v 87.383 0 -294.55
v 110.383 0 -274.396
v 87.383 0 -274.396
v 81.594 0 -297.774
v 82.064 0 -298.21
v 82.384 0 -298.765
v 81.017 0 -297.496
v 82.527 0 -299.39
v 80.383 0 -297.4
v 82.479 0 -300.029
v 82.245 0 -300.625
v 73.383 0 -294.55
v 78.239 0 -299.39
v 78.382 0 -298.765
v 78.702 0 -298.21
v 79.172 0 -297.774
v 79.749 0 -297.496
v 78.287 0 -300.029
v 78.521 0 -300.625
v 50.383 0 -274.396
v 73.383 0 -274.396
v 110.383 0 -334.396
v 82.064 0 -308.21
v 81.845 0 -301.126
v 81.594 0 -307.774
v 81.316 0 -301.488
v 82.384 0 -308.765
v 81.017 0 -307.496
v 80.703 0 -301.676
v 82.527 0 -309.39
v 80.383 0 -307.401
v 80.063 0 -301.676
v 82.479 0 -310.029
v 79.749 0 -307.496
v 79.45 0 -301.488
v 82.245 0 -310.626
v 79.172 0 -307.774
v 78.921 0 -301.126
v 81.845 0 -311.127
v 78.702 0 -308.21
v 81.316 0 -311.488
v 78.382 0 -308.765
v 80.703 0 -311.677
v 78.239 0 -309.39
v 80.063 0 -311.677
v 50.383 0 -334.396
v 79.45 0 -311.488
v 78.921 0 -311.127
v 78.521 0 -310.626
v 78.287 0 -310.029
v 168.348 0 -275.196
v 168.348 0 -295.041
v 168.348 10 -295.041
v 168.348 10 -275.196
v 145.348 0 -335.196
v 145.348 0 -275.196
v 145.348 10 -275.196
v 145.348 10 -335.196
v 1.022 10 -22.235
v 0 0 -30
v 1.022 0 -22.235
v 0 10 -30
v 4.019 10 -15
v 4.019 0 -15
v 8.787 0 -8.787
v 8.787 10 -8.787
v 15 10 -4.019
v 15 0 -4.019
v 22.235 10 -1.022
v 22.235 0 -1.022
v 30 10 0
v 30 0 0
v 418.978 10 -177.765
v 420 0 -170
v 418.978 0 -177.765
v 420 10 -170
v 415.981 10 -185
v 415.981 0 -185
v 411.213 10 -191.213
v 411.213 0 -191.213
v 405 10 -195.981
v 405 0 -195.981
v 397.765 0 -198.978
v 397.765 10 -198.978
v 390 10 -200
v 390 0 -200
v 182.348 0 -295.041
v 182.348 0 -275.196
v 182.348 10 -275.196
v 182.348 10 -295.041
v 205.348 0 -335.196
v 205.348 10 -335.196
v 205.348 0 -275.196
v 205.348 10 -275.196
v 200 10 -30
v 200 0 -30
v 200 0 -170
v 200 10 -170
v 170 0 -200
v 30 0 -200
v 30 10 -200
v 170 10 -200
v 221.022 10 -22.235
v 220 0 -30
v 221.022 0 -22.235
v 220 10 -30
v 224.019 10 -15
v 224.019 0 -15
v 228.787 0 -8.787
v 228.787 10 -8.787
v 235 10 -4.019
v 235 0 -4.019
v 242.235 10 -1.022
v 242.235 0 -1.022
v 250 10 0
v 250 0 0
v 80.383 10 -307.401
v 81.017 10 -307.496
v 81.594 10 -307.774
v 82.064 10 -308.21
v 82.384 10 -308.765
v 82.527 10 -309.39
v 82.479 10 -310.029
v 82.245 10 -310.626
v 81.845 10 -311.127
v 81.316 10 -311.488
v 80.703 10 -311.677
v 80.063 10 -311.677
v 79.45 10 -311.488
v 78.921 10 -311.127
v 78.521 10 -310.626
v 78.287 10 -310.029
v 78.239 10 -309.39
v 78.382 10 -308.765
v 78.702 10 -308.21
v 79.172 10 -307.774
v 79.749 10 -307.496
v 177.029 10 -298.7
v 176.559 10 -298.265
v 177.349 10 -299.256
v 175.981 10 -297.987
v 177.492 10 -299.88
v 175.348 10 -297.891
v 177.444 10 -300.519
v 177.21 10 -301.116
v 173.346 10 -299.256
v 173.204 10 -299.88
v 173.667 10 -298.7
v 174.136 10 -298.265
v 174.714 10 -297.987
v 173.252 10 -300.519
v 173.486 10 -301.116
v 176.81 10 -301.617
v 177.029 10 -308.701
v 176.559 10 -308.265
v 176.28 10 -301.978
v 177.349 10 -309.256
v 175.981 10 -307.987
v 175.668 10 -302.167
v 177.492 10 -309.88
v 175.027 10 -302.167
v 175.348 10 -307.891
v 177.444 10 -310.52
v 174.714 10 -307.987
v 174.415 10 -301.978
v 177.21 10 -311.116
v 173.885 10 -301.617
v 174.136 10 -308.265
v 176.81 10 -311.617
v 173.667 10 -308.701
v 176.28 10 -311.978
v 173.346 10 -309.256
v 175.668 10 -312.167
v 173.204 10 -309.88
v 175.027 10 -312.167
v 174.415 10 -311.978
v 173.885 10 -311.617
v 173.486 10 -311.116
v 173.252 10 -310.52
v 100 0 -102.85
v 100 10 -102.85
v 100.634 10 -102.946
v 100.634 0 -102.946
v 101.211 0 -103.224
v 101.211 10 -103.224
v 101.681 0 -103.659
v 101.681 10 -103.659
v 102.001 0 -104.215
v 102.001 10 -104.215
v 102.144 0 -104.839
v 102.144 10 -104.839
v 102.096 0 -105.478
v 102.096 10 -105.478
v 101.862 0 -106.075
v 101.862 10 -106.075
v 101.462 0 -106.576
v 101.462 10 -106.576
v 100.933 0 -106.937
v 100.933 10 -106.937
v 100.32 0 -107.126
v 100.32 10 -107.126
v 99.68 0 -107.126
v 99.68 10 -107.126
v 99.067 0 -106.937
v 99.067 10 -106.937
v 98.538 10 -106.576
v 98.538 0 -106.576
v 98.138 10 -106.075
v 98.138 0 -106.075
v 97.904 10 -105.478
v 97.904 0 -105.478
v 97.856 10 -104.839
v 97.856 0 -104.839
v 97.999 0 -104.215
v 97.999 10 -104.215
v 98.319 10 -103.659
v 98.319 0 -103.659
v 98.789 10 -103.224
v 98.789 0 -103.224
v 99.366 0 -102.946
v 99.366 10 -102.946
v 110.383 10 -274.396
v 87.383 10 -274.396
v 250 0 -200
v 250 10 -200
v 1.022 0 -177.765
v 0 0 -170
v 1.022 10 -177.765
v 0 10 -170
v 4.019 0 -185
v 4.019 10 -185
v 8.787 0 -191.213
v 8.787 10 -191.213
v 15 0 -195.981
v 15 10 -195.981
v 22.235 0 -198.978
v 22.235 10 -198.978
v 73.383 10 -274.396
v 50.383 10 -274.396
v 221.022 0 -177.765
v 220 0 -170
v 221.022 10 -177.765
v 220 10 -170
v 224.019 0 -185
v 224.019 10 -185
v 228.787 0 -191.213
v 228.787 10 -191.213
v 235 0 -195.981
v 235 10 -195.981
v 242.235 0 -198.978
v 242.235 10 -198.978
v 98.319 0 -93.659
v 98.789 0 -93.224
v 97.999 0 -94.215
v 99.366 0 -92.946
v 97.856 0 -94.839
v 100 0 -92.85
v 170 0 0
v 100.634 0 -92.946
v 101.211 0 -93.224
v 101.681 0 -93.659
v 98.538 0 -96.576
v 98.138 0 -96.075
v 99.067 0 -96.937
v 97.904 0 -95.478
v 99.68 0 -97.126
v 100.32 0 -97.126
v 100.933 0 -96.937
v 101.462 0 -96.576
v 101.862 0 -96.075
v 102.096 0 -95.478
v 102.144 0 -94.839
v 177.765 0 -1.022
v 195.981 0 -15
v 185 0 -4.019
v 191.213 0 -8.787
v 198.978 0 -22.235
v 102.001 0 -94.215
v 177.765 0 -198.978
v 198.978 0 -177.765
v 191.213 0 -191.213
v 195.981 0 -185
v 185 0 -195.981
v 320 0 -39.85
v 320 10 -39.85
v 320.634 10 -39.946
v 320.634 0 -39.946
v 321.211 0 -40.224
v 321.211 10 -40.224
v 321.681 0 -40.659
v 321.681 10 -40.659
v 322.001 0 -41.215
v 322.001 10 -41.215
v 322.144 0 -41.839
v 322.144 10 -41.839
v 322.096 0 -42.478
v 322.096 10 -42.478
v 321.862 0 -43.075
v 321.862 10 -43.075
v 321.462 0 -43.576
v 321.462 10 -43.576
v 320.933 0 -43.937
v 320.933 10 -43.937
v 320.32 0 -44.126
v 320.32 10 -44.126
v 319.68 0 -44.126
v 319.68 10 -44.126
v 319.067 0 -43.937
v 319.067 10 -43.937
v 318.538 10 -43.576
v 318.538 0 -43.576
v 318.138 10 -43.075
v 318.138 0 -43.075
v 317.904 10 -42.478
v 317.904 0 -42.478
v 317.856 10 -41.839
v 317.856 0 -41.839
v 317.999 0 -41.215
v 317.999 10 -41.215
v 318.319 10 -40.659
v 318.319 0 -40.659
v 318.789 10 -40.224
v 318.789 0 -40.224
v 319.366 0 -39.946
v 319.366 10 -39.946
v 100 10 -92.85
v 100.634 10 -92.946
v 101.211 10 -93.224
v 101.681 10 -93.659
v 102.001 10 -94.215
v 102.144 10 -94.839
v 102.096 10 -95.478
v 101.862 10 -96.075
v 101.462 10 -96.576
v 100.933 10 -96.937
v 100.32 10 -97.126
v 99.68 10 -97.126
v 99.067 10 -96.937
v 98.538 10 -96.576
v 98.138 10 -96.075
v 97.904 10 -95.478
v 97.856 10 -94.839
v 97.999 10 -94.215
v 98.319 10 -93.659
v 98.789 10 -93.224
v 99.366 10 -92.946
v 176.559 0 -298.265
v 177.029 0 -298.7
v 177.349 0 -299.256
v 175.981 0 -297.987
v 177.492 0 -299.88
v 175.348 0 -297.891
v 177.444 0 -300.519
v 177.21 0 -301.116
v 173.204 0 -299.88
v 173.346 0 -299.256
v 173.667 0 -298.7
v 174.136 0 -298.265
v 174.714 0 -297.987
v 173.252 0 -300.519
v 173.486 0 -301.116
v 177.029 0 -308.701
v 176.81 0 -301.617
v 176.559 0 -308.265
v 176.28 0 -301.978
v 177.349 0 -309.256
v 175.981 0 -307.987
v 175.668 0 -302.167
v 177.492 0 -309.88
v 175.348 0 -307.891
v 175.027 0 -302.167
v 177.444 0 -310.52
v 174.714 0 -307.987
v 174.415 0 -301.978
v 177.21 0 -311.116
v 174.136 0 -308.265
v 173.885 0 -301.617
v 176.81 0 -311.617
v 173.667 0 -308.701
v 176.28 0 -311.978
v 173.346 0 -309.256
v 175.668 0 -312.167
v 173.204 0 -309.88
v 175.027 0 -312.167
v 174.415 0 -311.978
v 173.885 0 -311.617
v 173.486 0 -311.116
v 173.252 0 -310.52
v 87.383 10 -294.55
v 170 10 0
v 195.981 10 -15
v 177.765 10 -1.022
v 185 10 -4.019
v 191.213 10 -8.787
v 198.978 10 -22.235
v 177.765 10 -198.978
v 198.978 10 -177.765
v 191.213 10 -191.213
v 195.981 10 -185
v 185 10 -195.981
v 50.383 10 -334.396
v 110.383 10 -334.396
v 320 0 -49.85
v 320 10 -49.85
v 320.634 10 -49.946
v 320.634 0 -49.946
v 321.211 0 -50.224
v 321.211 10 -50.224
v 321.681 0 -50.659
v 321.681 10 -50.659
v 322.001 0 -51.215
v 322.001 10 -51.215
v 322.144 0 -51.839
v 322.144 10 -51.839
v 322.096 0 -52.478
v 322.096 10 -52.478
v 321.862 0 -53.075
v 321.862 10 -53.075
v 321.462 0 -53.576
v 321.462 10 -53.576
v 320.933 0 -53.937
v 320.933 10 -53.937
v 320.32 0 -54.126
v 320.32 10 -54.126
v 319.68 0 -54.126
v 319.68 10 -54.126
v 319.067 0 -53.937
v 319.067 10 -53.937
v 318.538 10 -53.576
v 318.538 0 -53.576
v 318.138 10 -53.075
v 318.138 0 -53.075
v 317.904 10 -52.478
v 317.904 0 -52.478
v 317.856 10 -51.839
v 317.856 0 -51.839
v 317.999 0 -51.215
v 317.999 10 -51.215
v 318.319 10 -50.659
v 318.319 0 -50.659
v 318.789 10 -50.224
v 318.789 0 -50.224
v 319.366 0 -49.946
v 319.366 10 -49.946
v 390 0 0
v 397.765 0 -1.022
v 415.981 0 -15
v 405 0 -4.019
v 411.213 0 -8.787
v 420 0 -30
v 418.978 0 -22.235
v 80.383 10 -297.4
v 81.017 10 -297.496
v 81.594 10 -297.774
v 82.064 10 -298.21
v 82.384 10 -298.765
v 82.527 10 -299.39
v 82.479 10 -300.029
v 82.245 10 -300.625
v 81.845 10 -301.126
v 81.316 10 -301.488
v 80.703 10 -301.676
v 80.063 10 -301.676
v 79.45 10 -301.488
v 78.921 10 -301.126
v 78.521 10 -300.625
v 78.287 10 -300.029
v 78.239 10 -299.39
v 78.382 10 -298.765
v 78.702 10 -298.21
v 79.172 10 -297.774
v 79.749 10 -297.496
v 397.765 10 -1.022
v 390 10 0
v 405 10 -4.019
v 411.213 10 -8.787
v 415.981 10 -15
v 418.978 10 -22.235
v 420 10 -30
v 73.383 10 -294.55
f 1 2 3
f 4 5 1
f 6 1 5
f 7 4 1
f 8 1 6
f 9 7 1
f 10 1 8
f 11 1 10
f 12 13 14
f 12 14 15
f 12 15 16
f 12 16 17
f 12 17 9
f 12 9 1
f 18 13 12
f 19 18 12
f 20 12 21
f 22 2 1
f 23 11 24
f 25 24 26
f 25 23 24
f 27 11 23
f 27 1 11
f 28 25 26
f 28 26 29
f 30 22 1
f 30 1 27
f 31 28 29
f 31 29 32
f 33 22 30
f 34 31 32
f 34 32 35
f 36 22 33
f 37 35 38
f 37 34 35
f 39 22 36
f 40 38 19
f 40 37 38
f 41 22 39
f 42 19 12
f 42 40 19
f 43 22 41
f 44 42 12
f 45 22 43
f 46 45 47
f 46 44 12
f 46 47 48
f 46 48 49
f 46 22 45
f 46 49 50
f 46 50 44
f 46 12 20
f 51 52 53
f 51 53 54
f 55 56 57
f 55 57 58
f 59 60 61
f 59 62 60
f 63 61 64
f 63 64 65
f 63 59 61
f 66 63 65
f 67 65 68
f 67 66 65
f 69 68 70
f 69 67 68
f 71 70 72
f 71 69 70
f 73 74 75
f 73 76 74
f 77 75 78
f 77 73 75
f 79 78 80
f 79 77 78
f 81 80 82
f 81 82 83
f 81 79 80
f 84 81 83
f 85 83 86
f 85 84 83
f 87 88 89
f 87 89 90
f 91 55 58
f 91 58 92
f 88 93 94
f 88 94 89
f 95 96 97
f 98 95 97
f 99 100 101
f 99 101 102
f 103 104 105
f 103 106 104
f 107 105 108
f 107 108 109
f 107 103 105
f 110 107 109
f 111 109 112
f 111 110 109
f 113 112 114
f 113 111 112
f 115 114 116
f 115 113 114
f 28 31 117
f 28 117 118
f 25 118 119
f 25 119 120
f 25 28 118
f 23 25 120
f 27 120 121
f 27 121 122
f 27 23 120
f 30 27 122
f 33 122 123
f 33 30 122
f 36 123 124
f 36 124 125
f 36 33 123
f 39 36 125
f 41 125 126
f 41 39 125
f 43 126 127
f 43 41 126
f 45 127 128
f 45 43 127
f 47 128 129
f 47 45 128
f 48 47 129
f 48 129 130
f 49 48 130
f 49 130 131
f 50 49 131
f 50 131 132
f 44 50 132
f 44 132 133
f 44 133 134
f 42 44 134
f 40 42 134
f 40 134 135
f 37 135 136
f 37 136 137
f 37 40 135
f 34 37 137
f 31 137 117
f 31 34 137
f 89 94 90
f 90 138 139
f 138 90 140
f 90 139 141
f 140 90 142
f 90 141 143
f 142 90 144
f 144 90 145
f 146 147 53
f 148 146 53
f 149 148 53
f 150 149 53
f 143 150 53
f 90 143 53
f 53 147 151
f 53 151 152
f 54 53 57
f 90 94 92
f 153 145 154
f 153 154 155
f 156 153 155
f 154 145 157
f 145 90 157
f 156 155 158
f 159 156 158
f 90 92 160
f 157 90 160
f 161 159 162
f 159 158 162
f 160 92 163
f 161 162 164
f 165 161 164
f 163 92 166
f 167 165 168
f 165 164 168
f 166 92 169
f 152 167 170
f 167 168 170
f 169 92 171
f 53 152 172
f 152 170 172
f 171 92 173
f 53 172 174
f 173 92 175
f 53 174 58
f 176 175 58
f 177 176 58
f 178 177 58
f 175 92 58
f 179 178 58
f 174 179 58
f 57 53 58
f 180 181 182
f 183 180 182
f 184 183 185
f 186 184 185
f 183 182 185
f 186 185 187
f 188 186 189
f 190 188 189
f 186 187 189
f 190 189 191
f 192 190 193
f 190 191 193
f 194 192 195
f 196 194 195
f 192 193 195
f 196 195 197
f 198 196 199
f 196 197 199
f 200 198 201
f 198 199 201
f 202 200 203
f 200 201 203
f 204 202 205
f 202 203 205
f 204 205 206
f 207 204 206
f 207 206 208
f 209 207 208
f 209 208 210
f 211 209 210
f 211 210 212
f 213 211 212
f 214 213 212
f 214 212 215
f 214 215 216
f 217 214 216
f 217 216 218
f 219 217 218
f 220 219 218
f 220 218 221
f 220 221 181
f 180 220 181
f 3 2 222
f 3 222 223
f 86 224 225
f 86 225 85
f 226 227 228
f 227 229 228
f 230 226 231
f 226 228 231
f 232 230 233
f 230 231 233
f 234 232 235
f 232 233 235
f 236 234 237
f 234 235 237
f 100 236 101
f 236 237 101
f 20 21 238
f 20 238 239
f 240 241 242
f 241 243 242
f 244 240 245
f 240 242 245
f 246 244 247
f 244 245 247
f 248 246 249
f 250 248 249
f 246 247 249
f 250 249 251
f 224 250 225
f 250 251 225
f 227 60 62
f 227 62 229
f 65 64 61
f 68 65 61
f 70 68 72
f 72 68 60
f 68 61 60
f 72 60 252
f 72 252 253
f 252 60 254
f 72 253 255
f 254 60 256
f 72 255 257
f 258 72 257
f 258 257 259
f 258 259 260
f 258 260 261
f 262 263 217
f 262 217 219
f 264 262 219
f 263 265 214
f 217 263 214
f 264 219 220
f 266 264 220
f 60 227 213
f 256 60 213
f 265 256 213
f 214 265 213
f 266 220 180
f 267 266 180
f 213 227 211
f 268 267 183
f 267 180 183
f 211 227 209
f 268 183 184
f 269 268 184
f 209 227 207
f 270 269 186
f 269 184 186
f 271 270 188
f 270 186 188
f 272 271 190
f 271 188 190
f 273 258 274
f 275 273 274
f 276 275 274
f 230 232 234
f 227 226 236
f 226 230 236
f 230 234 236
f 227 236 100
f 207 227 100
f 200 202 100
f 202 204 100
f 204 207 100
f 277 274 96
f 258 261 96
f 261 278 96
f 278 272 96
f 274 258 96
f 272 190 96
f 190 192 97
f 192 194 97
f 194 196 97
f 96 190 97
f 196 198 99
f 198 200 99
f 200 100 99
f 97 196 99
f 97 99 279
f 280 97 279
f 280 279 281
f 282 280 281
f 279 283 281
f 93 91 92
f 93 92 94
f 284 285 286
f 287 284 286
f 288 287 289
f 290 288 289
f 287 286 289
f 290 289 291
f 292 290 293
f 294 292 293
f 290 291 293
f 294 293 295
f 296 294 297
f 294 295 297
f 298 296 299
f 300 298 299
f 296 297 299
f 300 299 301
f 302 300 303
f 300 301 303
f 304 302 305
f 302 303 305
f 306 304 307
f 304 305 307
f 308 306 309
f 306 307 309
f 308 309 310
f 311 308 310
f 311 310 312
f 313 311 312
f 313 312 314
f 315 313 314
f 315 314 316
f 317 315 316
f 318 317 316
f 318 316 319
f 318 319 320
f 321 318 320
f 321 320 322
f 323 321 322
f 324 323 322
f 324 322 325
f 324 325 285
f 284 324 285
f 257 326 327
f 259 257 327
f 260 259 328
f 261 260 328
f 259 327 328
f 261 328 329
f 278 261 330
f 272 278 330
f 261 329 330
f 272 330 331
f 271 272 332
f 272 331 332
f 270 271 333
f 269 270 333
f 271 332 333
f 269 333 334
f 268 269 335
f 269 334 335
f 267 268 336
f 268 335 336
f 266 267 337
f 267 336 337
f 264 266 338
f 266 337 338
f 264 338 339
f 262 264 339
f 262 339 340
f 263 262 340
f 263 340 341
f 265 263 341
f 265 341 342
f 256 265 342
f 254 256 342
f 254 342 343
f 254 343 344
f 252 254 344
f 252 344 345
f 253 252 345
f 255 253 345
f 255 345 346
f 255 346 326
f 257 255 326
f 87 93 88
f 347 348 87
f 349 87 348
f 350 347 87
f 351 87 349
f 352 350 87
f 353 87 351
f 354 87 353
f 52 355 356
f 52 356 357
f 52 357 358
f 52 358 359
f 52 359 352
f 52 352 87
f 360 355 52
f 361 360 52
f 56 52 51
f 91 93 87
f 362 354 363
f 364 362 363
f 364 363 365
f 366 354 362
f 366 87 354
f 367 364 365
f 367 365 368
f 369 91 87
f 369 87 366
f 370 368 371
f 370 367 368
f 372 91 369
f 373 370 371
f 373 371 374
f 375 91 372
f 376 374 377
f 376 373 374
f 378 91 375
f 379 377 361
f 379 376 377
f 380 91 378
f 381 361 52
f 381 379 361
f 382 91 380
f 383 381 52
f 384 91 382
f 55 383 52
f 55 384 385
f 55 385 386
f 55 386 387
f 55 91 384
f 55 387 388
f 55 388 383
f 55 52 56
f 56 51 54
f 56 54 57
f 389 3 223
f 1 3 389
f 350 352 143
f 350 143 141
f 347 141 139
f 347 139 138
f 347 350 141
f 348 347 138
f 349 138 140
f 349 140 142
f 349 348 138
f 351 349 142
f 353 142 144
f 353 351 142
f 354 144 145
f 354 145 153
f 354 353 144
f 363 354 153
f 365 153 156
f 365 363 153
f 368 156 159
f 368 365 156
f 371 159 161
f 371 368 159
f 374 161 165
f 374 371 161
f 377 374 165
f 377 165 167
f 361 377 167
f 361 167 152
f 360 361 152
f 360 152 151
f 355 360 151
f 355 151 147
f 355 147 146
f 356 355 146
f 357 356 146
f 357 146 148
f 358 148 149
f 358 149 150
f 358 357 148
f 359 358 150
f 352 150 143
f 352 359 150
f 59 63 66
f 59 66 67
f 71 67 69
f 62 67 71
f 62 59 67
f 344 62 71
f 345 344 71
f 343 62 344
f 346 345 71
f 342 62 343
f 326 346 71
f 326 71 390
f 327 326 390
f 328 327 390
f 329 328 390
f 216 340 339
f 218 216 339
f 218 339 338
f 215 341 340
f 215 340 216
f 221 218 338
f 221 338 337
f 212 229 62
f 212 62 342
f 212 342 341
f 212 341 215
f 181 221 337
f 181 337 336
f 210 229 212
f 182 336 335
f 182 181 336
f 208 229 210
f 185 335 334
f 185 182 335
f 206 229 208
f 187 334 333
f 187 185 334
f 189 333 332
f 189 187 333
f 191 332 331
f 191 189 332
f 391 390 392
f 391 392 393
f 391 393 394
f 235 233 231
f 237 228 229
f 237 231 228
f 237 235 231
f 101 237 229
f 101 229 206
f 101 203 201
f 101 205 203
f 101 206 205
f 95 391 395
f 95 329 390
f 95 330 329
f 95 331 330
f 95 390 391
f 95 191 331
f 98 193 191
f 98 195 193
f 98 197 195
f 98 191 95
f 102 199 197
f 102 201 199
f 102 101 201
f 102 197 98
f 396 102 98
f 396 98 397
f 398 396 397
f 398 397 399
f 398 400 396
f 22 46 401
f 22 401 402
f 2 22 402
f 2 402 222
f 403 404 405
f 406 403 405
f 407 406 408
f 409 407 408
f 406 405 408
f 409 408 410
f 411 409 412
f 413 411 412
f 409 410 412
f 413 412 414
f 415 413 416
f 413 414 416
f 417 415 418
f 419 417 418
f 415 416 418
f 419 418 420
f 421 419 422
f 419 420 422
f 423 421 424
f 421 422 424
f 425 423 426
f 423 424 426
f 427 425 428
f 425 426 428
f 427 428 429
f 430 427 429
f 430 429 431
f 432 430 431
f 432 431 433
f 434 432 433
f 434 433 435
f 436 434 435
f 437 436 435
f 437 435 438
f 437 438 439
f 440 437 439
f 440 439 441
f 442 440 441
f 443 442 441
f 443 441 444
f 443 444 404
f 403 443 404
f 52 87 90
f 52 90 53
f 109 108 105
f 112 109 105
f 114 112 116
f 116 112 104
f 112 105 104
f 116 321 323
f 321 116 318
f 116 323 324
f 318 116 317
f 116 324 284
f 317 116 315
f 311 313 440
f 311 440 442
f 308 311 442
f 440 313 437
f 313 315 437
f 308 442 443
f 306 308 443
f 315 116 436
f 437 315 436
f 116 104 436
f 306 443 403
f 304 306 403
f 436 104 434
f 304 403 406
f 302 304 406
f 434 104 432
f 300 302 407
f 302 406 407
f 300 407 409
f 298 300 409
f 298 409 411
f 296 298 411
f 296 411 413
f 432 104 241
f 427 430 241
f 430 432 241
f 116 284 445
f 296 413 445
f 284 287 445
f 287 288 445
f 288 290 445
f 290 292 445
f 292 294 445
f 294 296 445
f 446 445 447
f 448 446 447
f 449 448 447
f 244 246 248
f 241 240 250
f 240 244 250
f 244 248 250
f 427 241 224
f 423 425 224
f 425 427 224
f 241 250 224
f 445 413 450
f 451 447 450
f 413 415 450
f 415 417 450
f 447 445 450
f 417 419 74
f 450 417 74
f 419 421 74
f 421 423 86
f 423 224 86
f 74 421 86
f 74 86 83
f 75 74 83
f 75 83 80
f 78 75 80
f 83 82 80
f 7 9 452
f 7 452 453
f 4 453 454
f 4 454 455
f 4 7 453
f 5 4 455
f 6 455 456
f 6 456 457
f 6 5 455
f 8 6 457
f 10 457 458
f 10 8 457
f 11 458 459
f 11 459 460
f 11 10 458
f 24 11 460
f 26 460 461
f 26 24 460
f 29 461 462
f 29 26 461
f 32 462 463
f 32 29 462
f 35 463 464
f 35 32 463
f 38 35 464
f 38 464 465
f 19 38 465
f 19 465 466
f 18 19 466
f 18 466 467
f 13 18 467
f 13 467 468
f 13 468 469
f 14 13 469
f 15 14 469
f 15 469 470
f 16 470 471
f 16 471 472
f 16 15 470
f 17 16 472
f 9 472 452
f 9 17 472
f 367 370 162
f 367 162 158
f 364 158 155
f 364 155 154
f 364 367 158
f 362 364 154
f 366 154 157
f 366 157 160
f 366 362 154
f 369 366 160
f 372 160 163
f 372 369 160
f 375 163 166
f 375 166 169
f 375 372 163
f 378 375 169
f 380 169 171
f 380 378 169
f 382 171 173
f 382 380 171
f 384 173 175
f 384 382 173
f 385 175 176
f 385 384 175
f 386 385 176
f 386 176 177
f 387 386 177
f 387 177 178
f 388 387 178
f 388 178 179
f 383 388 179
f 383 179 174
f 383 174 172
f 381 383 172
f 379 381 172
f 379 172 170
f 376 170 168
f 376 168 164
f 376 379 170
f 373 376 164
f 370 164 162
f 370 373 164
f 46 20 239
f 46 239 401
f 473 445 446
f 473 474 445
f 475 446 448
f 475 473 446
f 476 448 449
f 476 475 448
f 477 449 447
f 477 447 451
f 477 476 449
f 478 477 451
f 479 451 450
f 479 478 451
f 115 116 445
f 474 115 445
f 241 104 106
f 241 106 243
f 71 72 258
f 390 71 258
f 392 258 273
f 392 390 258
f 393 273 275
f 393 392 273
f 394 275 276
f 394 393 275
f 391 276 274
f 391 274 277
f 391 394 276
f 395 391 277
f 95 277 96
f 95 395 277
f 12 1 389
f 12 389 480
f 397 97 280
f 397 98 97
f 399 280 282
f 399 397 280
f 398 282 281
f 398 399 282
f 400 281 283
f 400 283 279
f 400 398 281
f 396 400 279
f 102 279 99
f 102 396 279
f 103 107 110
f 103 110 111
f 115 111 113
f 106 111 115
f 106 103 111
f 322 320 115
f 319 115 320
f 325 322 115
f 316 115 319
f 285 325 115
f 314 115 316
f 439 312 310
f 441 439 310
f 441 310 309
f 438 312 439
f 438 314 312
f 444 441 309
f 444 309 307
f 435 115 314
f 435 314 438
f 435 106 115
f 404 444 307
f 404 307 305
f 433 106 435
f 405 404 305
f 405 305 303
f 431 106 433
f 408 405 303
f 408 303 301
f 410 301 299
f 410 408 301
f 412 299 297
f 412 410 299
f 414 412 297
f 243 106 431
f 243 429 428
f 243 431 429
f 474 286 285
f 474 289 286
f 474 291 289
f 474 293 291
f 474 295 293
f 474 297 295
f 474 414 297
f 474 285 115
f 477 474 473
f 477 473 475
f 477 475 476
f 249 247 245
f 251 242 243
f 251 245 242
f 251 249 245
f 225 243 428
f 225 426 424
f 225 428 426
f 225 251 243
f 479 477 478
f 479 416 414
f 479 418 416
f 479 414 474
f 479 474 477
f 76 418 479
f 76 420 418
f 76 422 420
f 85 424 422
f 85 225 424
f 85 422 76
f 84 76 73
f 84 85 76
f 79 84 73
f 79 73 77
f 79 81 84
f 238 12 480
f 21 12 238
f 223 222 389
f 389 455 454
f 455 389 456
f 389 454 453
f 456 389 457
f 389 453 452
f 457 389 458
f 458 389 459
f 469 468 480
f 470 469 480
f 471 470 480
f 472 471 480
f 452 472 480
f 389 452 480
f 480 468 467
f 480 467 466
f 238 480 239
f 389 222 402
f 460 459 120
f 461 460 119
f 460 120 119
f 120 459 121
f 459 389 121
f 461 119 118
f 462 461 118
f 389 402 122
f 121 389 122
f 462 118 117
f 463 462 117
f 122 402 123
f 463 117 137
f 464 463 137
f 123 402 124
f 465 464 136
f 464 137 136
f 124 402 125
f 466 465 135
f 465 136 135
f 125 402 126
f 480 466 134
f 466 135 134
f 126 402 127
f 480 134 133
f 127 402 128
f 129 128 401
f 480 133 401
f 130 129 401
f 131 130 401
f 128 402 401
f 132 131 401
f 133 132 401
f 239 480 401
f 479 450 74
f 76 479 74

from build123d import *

# Parameters (mm, degrees)
SKETCH1_W             = 200
SKETCH1_H             = 200
BOSS_EXTRUDE1_DEPTH   = 10
BOSS_EXTRUDE1_2_DEPTH = 10
FILLET1_R             = 30
FILLET2_R             = 30
SKETCH2_R             = 2.15
CUT_EXTRUDE1_DEPTH    = 15
SKETCH3_R             = 2.15
CUT_EXTRUDE2_DEPTH    = 15
SKETCH4_R             = 2.15
BOSS_EXTRUDE2_DEPTH   = 10
BOSS_EXTRUDE2_2_DEPTH = 10


with BuildPart() as part:
    # Sketch1 → Boss-Extrude1 (new body)
    with BuildSketch(Plane(origin=(0, 0, 0), x_dir=(1, 0, 0), z_dir=(0, 1, 0))):
        with Locations((100, 100)):
            Rectangle(SKETCH1_W, SKETCH1_H)
    extrude(amount=BOSS_EXTRUDE1_DEPTH)

    # Fillet1
    fillet1_edges = [part.edges().sort_by_distance(p)[0] for p in [
        (0, 5, -200),
        (200, 5, -200),
        (200, 5, 0),
        (0, 5, 0),
    ]]
    fillet(fillet1_edges, radius=FILLET1_R)

    # Sketch2 → Cut-Extrude1 (cut)
    with BuildSketch(Plane(origin=(0, 10, 0), x_dir=(1, 0, 0), z_dir=(0, 1, 0))):
        with Locations(Location((100, 105, 0), (0, 0, 270))):
            Circle(SKETCH2_R)
        with Locations(Location((100, 95, 0), (0, 0, 270))):
            Circle(SKETCH2_R)
    extrude(amount=-CUT_EXTRUDE1_DEPTH, mode=Mode.SUBTRACT)


with BuildPart() as body_2:
    # Sketch1 → Boss-Extrude1 2 (new body)
    with BuildSketch(Plane(origin=(0, 0, 0), x_dir=(1, 0, 0), z_dir=(0, 1, 0))):
        with Locations((320, 100)):
            Rectangle(SKETCH1_W, SKETCH1_H)
    extrude(amount=BOSS_EXTRUDE1_2_DEPTH)

    # Fillet2
    fillet2_edges = [body_2.edges().sort_by_distance(p)[0] for p in [
        (220, 5, -200),
        (420, 5, -200),
        (420, 5, 0),
        (220, 5, 0),
    ]]
    fillet(fillet2_edges, radius=FILLET2_R)

    # Sketch3 → Cut-Extrude2 (cut)
    with BuildSketch(Plane(origin=(0, 10, 0), x_dir=(1, 0, 0), z_dir=(0, 1, 0))):
        with Locations(Location((320, 52, 0), (0, 0, 270))):
            Circle(SKETCH3_R)
        with Locations(Location((320, 42, 0), (0, 0, 270))):
            Circle(SKETCH3_R)
    extrude(amount=-CUT_EXTRUDE2_DEPTH, mode=Mode.SUBTRACT)


with BuildPart() as body_3:
    # Sketch4 → Boss-Extrude2 (new body)
    with BuildSketch(Plane(origin=(0, 0, 0), x_dir=(1, 0, 0), z_dir=(0, 1, 0))):
        Polygon((50.383027517, 334.395521825), (110.383027517, 334.395521825), (110.383027517, 274.395521825), (87.383027517, 274.395521825), (87.383027517, 294.550426589), (73.383027517, 294.550426589), (73.383027517, 274.395521825), (50.383027517, 274.395521825), align=None)
        with Locations(Location((80.383027517, 309.550560012, 0), (0, 0, 270))):
            Circle(SKETCH4_R, mode=Mode.SUBTRACT)
        with Locations(Location((80.383027517, 299.550426589, 0), (0, 0, 270))):
            Circle(SKETCH4_R, mode=Mode.SUBTRACT)
    extrude(amount=BOSS_EXTRUDE2_DEPTH)


with BuildPart() as body_4:
    # Sketch4 → Boss-Extrude2 2 (new body)
    with BuildSketch(Plane(origin=(0, 0, 0), x_dir=(1, 0, 0), z_dir=(0, 1, 0))):
        Polygon((145.347622786, 335.196024893), (205.347622786, 335.196024893), (205.347622786, 275.196024893), (182.347622786, 275.196024893), (182.347622786, 295.040986706), (168.347622786, 295.040986706), (168.347622786, 275.196024893), (145.347622786, 275.196024893), align=None)
        with Locations(Location((175.347622786, 310.041120128, 0), (0, 0, 270))):
            Circle(SKETCH4_R, mode=Mode.SUBTRACT)
        with Locations(Location((175.347622786, 300.040986706, 0), (0, 0, 270))):
            Circle(SKETCH4_R, mode=Mode.SUBTRACT)
    extrude(amount=BOSS_EXTRUDE2_2_DEPTH)


solid = Compound([part.part, body_2.part, body_3.part, body_4.part])
